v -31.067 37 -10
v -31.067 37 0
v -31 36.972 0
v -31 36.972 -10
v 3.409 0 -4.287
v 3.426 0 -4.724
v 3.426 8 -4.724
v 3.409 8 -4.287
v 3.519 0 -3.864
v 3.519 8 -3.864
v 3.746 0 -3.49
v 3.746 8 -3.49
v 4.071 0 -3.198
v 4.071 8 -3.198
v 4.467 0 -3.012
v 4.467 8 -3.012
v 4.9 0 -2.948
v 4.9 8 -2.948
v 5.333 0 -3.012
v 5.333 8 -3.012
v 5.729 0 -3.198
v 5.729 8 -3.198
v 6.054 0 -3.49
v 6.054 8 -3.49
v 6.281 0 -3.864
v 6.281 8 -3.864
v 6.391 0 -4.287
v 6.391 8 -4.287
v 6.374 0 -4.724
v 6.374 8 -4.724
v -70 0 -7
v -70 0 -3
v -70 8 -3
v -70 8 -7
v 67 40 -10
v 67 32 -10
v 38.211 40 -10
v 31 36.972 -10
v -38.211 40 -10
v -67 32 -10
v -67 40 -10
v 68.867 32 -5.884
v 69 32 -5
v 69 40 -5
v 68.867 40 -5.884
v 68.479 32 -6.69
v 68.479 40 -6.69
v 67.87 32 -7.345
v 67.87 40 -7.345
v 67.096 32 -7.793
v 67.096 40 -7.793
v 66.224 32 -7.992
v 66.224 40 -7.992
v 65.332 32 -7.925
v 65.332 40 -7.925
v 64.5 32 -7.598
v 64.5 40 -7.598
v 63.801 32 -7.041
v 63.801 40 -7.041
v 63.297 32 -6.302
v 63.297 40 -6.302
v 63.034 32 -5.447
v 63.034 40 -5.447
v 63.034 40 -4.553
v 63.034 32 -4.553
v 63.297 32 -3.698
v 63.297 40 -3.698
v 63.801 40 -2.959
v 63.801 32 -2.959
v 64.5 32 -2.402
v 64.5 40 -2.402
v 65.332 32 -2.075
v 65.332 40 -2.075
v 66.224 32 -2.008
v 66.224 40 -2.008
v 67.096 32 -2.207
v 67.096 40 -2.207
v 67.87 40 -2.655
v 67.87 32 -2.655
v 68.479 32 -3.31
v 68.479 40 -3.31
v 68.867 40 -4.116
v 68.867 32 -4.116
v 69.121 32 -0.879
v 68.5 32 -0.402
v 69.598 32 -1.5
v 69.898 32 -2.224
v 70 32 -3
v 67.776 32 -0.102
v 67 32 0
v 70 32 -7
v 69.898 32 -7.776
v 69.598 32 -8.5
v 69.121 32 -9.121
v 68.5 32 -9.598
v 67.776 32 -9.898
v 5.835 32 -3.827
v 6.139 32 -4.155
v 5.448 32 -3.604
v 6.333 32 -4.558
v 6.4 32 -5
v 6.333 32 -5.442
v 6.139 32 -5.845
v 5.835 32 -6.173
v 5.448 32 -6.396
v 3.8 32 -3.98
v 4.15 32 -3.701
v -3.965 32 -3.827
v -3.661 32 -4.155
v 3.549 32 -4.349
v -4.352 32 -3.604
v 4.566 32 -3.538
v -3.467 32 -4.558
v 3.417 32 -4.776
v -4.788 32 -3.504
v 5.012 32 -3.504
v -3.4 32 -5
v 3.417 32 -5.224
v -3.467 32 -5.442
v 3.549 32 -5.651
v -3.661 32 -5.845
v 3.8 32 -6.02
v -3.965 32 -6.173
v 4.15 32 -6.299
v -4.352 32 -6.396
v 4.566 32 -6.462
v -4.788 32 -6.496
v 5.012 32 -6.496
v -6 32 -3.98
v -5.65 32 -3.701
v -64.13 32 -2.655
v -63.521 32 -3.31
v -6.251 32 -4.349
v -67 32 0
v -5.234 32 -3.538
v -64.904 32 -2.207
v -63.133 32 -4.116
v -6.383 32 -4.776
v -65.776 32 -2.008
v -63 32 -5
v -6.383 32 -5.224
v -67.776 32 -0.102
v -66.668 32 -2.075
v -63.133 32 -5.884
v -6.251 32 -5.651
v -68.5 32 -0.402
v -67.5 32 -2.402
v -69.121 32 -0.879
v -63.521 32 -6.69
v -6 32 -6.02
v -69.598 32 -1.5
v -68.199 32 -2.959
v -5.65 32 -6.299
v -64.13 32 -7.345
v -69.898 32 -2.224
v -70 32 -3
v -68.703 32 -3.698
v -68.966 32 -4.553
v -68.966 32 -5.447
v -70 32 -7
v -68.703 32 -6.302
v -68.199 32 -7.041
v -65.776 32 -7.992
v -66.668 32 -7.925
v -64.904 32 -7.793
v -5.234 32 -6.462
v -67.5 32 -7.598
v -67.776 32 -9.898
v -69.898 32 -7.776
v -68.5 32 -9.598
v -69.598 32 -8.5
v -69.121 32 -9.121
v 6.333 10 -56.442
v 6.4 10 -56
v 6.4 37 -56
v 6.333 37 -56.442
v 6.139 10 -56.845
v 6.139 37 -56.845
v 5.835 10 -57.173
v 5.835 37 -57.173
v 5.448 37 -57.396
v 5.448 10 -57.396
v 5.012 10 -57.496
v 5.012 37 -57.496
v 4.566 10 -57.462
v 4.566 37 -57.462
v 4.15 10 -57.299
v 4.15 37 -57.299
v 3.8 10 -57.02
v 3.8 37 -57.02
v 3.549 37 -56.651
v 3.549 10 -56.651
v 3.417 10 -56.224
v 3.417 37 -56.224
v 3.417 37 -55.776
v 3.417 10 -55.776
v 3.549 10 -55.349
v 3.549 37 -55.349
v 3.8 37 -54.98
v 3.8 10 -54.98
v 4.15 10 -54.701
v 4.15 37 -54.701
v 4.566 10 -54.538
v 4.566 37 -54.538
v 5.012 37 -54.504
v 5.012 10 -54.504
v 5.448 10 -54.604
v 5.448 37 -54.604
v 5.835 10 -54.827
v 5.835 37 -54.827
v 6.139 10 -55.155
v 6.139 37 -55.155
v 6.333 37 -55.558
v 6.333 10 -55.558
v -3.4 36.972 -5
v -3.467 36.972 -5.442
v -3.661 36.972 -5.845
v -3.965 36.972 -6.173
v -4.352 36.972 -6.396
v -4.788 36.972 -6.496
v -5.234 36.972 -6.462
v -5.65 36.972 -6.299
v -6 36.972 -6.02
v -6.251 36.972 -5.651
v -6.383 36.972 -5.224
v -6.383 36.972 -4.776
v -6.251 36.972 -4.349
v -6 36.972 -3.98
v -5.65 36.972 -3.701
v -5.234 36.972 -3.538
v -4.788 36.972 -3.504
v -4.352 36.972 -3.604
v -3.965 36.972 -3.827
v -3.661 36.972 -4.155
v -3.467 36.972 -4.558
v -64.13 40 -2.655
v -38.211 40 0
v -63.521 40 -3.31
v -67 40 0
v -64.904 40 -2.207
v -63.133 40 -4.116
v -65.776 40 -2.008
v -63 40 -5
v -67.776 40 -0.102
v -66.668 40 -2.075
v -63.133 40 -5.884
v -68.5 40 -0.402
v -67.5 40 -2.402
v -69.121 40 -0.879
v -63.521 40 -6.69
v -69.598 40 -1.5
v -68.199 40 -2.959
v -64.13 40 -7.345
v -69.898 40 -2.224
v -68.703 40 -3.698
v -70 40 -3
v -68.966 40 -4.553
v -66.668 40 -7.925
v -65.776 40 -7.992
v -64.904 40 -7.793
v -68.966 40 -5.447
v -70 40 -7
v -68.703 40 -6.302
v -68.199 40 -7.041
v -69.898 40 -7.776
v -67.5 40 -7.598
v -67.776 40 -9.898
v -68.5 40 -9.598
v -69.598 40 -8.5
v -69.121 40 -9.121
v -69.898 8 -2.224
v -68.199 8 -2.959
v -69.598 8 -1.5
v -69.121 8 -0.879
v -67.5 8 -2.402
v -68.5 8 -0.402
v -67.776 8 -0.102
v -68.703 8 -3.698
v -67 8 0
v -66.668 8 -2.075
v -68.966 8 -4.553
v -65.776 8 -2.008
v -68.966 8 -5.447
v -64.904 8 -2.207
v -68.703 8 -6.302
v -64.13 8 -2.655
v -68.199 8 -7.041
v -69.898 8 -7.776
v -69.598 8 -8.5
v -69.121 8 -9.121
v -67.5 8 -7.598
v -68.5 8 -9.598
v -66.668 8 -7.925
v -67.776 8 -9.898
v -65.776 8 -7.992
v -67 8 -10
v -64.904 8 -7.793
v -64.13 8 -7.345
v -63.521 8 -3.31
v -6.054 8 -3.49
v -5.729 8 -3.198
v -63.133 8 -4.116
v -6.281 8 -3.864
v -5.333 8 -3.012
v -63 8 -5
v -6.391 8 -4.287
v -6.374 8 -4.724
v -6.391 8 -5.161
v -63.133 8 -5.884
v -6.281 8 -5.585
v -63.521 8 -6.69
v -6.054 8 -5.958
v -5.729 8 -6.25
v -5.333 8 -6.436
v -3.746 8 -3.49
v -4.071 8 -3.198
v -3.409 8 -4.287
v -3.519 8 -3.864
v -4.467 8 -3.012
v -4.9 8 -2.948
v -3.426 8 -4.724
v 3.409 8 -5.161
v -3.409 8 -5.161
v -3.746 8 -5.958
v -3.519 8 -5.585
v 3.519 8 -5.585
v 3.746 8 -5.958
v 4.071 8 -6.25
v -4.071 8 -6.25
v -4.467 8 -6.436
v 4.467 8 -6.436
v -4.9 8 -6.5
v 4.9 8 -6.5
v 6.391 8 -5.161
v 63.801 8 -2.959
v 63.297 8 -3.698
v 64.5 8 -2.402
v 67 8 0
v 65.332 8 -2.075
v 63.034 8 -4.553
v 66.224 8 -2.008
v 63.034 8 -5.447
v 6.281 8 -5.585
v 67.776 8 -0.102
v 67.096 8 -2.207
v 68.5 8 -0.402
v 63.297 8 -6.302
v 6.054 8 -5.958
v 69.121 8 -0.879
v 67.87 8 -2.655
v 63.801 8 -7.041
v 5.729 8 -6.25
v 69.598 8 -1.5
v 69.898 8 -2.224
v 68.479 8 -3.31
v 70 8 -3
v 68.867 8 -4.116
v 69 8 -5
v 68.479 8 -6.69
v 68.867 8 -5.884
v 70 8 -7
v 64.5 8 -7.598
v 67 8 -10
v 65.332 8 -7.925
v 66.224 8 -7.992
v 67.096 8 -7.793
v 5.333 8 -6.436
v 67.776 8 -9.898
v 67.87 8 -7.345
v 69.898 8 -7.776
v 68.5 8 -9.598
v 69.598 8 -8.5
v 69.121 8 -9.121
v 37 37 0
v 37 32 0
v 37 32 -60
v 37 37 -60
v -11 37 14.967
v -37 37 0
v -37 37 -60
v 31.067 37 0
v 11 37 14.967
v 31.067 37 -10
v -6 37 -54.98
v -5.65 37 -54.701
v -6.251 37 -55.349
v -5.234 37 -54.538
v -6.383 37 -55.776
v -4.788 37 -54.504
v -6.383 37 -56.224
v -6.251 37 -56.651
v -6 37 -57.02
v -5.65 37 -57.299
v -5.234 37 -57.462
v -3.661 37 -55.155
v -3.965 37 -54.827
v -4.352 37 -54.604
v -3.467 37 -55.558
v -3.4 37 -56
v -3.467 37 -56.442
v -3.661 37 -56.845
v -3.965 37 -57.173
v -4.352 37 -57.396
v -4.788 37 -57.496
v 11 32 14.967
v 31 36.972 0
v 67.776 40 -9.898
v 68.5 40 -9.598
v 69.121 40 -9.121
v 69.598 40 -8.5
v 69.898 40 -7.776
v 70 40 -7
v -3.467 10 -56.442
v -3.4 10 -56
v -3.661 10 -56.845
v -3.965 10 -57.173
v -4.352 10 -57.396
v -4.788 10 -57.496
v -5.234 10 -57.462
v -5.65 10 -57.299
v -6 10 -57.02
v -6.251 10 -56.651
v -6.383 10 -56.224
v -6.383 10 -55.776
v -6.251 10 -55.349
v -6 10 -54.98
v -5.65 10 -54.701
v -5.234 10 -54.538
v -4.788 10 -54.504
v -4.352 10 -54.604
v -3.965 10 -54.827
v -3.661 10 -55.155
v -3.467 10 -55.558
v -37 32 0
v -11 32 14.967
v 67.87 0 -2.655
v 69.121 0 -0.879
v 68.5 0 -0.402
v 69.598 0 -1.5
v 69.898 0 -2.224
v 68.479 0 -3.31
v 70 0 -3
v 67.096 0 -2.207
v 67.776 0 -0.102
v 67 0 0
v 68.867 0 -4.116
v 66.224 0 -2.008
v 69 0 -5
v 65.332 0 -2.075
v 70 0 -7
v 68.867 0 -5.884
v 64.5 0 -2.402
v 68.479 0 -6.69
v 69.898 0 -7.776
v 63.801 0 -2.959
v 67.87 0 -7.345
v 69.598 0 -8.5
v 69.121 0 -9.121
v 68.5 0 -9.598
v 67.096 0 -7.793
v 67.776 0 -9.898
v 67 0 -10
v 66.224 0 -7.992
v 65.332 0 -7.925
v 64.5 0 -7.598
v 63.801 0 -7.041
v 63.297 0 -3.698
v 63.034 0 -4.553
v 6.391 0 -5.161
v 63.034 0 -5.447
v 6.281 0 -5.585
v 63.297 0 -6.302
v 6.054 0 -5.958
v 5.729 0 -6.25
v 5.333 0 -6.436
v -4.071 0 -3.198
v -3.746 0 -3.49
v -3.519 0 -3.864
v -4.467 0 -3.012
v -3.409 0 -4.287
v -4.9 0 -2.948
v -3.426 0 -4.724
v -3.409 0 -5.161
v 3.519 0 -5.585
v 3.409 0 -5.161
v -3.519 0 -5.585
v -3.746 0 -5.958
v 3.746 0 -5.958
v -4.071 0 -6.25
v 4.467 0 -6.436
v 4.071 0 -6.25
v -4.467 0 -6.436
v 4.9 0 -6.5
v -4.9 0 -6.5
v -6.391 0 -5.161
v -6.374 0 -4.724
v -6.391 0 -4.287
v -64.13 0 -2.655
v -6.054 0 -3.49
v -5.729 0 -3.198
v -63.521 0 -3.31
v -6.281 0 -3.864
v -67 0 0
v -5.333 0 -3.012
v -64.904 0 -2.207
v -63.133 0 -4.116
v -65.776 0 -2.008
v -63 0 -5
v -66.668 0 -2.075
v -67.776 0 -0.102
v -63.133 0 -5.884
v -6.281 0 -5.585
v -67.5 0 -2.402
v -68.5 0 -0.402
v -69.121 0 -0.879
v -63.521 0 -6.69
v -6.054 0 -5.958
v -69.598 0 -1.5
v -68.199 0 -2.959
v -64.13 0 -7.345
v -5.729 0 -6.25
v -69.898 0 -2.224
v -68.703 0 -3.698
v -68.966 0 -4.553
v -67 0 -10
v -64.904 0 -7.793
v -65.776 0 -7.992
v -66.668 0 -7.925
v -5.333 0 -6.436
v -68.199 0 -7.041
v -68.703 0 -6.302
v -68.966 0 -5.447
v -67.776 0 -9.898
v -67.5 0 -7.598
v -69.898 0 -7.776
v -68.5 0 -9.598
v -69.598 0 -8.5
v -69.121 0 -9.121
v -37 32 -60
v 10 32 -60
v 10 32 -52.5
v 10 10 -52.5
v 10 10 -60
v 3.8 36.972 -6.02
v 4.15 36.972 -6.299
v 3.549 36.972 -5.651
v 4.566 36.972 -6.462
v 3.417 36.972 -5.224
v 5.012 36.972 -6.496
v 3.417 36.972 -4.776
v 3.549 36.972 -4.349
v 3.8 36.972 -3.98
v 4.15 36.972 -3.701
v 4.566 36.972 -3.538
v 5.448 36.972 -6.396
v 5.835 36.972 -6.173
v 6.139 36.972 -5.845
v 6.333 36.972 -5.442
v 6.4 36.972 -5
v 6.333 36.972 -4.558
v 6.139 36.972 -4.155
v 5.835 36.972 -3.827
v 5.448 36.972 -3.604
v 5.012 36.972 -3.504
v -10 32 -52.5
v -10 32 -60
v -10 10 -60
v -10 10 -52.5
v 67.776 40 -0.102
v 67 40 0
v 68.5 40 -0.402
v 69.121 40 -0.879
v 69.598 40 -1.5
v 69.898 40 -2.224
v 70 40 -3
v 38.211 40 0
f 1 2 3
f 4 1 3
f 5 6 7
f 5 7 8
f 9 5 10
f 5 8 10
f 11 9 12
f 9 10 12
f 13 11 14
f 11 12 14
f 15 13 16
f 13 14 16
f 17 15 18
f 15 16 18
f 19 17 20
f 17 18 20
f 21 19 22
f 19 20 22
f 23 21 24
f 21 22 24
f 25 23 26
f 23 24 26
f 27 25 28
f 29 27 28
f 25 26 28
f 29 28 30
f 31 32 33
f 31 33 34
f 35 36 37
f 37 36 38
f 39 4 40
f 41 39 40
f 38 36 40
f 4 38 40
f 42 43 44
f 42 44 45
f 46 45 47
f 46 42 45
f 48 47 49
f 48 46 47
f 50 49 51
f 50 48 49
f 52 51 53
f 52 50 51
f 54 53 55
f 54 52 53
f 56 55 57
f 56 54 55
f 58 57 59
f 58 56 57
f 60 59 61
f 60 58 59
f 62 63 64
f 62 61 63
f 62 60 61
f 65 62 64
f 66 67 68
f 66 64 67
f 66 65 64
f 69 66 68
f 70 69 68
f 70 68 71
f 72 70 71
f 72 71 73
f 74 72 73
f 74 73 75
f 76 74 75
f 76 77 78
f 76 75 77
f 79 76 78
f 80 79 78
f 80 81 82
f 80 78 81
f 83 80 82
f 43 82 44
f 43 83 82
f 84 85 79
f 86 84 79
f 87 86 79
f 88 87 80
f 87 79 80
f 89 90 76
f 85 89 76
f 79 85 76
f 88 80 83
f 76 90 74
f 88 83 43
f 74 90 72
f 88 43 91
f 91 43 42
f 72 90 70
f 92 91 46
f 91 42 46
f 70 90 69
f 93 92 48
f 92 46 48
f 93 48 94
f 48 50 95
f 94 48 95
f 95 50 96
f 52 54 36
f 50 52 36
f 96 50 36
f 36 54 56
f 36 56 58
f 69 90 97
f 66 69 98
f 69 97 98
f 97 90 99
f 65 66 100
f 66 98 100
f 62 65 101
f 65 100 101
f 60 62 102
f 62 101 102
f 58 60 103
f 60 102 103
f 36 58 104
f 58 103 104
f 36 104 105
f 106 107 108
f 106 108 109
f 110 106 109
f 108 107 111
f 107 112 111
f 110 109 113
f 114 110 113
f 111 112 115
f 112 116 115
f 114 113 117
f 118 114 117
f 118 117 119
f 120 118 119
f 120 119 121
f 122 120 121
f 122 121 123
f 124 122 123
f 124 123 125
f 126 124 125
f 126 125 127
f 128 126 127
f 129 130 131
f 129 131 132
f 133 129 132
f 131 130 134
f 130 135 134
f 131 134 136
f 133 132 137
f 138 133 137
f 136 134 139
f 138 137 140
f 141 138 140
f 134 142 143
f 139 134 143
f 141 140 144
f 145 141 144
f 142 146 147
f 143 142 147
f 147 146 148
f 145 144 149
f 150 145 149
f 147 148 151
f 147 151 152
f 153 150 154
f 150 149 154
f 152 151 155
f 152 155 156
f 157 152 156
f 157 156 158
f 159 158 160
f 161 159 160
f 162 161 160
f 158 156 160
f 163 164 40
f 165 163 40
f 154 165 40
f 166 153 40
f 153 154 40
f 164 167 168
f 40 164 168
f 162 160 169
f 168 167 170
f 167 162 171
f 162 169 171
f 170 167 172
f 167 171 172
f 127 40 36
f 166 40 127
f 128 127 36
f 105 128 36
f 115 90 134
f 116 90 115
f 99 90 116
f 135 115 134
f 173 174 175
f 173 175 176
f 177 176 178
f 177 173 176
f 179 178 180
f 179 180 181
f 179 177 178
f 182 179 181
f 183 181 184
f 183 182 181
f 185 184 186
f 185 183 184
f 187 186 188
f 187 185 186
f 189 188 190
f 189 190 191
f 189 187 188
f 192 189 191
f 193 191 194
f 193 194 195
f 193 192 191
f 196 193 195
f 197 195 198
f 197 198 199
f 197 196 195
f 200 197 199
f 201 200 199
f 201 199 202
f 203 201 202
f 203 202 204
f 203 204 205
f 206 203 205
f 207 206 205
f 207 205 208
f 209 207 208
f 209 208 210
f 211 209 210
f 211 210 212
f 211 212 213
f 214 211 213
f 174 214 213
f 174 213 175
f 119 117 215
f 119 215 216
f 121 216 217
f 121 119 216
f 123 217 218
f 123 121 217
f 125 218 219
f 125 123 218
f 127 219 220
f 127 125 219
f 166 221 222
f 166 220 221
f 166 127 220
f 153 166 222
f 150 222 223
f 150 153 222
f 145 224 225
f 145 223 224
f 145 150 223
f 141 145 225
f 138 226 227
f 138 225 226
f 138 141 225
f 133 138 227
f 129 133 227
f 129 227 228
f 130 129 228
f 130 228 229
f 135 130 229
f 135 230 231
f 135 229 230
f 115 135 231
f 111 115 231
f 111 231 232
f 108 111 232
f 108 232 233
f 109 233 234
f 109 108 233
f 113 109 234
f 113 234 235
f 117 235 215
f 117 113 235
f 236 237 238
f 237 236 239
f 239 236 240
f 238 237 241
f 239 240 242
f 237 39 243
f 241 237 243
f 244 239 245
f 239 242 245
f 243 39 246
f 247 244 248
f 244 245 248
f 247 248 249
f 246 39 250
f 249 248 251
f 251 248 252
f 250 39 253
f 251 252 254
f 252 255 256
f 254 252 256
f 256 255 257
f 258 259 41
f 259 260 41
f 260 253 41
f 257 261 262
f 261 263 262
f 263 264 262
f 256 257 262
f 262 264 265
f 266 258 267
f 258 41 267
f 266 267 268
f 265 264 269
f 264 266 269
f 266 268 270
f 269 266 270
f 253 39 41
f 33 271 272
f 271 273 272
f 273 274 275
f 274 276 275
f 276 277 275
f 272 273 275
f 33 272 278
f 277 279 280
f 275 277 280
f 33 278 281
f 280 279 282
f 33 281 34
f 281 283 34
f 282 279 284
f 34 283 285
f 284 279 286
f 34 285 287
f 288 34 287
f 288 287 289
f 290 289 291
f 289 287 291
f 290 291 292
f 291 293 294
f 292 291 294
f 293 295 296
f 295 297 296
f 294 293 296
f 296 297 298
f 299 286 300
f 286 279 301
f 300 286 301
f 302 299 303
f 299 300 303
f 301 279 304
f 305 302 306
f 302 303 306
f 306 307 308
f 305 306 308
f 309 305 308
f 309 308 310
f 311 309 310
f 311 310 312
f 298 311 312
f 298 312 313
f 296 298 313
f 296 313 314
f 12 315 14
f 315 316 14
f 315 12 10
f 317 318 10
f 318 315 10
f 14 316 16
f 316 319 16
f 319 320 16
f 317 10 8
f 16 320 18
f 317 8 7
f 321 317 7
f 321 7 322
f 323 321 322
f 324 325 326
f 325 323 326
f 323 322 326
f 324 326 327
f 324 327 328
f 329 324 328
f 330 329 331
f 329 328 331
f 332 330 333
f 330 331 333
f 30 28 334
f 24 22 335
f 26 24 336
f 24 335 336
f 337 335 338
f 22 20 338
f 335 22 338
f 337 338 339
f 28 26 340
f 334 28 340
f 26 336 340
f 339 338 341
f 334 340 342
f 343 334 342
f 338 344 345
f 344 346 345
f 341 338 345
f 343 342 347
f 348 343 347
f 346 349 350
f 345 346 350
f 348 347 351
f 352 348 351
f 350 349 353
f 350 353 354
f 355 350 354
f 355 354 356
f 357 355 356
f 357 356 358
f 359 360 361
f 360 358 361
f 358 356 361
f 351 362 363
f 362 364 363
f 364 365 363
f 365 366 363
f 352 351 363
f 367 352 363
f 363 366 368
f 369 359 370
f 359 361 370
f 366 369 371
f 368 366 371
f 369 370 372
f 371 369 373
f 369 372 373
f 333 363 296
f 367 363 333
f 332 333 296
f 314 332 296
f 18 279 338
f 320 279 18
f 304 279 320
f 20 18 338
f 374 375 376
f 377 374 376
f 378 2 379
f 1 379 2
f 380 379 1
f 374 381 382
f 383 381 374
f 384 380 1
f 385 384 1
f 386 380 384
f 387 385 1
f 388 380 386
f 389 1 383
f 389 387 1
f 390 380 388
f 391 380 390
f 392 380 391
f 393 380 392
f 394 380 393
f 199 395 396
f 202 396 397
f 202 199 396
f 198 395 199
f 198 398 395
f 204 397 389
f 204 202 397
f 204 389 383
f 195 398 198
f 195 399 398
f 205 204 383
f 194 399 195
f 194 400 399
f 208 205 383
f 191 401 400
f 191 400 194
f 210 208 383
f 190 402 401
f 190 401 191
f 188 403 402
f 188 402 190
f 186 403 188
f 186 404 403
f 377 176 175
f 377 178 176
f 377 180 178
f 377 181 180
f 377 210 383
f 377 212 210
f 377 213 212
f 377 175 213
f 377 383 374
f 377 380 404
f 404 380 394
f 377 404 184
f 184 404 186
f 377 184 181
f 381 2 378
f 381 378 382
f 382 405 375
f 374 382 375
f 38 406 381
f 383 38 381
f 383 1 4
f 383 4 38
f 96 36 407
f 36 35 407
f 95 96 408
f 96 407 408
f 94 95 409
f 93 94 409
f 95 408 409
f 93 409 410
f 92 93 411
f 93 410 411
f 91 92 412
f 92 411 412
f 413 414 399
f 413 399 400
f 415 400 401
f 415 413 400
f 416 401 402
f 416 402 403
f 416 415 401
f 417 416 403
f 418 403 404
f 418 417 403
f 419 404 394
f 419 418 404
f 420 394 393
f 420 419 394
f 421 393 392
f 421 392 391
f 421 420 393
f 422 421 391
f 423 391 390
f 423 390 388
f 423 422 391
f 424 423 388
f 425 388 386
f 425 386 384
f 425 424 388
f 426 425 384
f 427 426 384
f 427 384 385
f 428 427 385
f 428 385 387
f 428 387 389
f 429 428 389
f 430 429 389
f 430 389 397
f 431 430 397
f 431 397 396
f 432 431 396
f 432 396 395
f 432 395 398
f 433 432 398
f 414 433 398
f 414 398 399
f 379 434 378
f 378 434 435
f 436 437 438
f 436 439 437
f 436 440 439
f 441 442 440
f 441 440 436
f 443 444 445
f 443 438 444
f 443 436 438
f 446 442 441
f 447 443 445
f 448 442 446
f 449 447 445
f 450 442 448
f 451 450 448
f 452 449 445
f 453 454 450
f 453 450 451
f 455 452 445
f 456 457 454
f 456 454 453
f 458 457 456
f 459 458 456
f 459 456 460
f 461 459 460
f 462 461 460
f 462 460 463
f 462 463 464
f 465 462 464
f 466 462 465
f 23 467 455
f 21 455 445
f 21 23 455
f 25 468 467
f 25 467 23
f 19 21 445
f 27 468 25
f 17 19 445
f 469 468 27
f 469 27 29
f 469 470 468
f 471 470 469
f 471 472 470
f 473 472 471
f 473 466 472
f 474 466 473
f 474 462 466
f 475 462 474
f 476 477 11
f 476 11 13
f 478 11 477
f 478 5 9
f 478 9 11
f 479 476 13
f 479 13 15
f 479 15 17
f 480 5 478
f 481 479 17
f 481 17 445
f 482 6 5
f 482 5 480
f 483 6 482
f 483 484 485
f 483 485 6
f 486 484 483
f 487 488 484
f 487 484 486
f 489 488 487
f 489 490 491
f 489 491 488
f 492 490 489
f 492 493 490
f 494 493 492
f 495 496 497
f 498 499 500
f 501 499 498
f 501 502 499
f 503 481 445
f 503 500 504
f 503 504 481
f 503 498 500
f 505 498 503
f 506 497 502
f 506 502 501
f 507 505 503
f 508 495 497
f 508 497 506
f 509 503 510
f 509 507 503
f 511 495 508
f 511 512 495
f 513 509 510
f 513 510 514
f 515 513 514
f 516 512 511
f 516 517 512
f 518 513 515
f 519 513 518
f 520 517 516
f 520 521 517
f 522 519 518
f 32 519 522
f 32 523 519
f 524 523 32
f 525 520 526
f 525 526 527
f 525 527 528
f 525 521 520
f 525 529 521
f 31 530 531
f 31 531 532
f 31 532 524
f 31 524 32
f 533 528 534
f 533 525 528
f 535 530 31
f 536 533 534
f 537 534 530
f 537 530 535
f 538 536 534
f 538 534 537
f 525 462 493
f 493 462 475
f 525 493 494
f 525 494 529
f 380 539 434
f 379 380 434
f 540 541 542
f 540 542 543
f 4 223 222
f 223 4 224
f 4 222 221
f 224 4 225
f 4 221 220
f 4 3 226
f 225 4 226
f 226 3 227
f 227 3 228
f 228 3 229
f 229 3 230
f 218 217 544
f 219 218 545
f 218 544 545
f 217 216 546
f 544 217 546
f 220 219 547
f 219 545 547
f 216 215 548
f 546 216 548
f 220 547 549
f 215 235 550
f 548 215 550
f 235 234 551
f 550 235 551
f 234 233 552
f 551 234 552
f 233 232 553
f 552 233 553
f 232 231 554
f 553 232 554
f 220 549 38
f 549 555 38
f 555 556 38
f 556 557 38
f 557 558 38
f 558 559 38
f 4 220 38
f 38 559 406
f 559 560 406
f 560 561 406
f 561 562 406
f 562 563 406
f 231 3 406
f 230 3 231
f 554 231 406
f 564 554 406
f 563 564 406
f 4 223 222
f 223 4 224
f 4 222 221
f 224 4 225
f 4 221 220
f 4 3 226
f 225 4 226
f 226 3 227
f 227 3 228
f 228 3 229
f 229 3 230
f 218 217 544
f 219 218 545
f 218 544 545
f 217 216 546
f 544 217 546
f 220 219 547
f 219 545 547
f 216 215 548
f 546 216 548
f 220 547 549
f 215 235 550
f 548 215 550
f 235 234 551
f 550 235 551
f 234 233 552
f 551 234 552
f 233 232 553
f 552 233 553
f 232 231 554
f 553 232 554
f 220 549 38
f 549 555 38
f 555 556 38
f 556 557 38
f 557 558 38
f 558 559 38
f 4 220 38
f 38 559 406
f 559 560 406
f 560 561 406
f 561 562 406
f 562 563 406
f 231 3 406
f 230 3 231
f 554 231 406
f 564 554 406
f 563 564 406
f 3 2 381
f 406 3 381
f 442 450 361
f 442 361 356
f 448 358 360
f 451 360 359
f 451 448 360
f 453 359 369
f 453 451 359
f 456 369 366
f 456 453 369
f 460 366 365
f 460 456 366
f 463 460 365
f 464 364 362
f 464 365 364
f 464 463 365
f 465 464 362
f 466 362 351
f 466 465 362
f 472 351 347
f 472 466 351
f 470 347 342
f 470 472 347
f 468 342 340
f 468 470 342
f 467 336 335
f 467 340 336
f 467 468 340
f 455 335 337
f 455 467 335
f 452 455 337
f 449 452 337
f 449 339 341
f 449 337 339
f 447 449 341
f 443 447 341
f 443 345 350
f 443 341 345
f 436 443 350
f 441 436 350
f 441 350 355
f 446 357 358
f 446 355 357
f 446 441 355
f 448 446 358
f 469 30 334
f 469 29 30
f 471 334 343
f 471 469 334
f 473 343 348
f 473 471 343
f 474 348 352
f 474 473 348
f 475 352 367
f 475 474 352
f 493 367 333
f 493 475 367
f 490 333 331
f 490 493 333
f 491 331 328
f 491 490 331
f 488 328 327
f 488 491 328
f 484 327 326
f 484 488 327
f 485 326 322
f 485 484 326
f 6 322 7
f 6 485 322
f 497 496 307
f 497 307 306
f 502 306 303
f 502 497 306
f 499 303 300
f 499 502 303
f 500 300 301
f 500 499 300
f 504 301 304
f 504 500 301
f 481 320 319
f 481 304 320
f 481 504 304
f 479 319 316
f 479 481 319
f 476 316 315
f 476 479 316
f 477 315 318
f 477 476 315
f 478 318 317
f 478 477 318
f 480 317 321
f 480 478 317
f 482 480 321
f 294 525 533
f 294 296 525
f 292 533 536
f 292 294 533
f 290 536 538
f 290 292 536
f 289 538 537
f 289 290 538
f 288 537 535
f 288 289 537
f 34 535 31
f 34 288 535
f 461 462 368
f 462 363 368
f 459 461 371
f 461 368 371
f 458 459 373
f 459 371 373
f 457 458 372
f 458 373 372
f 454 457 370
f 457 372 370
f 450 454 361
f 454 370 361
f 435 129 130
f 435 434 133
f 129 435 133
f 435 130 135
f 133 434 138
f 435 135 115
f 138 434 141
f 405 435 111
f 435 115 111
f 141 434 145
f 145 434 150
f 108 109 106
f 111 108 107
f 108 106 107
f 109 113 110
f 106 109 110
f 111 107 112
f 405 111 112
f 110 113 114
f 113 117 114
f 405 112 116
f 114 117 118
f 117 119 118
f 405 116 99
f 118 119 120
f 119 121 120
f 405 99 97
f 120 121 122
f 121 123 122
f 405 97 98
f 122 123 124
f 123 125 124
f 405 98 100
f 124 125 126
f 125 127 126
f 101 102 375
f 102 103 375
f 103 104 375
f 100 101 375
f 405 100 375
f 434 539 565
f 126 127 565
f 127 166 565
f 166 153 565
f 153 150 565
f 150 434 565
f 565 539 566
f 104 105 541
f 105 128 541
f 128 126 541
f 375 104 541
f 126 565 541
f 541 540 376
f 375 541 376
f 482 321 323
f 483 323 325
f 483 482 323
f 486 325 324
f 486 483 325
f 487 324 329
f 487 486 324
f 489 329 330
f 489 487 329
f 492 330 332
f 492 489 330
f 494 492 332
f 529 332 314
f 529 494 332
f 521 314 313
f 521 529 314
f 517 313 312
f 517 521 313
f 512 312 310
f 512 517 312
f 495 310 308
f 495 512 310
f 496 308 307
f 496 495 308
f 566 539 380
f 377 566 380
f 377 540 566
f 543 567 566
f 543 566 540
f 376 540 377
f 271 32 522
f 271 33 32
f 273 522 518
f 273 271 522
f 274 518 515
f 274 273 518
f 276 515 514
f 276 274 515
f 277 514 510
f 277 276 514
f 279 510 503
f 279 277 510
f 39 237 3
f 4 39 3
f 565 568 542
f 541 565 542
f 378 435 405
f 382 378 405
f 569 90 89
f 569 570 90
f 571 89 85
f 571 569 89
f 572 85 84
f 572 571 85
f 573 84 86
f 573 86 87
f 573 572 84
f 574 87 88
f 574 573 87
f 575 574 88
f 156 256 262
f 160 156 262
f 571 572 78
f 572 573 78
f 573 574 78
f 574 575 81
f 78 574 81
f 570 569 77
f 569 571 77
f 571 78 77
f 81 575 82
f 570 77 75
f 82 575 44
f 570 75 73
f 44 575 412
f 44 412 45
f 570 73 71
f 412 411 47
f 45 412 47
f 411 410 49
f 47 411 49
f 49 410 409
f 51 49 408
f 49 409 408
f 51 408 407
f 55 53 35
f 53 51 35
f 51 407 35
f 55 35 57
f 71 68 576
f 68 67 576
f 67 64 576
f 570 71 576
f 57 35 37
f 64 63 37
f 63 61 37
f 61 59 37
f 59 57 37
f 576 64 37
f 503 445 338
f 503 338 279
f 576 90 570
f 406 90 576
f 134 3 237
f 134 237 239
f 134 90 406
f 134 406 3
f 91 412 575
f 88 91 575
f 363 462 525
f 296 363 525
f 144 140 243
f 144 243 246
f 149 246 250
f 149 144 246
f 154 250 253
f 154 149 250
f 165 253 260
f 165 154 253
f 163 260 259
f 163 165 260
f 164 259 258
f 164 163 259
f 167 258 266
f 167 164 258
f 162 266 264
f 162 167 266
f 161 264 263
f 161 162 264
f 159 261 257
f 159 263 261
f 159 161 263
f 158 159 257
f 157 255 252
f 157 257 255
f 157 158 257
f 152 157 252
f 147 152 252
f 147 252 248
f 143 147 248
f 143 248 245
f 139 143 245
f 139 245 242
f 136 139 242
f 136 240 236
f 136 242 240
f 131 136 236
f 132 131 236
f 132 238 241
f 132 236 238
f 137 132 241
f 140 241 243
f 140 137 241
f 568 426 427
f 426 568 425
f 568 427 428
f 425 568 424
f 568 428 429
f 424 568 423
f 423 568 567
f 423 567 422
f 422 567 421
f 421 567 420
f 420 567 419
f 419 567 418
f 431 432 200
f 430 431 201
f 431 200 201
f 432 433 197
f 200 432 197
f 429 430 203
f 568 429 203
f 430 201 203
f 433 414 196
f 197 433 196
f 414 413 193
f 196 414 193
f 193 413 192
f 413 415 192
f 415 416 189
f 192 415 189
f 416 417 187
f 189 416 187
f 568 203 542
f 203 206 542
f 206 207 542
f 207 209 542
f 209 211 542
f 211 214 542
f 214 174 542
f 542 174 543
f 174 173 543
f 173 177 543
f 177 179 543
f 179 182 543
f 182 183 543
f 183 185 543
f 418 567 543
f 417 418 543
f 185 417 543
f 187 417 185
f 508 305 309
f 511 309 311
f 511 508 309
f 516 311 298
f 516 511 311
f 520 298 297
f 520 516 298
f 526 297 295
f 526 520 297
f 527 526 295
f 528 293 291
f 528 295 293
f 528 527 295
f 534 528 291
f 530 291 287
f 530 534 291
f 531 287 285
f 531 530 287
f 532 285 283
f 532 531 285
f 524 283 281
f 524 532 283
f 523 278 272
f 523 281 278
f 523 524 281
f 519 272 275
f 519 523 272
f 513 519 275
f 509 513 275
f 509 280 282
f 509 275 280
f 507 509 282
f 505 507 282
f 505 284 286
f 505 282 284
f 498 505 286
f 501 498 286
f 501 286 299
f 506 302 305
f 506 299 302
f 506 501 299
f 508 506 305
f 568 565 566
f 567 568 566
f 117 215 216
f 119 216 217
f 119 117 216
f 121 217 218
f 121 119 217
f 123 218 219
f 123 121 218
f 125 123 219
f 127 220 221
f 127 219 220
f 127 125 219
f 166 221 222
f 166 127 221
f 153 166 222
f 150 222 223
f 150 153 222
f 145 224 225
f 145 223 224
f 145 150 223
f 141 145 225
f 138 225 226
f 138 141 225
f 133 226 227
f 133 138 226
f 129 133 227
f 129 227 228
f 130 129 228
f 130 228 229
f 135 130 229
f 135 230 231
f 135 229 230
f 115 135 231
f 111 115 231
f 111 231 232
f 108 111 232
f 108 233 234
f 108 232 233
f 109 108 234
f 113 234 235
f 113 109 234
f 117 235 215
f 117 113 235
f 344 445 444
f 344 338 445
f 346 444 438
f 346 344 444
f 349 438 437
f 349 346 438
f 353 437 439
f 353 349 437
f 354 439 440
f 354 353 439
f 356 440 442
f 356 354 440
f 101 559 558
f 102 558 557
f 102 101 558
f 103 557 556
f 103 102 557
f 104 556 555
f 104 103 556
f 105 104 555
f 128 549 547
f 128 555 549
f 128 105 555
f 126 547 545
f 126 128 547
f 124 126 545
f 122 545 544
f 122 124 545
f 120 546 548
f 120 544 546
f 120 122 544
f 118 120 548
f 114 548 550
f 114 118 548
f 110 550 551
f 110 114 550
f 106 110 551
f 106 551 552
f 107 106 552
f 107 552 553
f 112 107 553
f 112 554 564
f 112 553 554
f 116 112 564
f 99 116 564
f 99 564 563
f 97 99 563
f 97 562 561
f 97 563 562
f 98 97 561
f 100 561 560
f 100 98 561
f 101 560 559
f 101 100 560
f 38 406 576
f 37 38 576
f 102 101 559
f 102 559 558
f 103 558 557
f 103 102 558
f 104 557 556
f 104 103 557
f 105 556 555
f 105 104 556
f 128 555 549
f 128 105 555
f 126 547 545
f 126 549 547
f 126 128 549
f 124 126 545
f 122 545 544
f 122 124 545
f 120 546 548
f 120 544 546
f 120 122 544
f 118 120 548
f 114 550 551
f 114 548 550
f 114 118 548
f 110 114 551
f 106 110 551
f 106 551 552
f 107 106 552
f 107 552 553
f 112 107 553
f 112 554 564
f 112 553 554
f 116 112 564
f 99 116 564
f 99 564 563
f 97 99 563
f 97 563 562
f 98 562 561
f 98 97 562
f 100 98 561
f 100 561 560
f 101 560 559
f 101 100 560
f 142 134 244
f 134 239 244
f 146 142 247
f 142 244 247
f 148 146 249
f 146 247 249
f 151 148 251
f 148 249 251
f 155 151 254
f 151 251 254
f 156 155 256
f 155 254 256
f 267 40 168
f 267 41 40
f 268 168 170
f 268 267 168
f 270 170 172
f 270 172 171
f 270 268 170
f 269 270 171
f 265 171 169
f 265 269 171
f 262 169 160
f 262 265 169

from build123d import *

# Parameters (mm, degrees)
SKETCH1_R               = 1.5
BOSS_EXTRUDE1_DEPTH     = 40
SKETCH3_W               = 10
SKETCH3_H               = 24
CUT_EXTRUDE1_DEPTH      = 71
CUT_EXTRUDE1_DEPTH_BACK = 71
FILLET2_R               = 3
FILLET3_R               = 3
BOSS_EXTRUDE4_START     = 32
SKETCH7_R               = 1.5
BOSS_EXTRUDE4_DEPTH     = 5
BOSS_EXTRUDE5_START     = 10
SKETCH7_5_W             = 20
SKETCH7_5_H             = 7.5
SKETCH7_5_R             = 1.5
BOSS_EXTRUDE5_DEPTH     = 22
SKETCH5_R               = 1.5
CUT_EXTRUDE4_DEPTH      = 11
SKETCH4_R               = 3
CUT_EXTRUDE2_DEPTH      = 41
CUT_EXTRUDE2_DEPTH_BACK = 1
CUT_EXTRUDE6_DEPTH      = 10


with BuildPart() as part:
    # Sketch1 → Boss-Extrude1 (new body)
    with BuildSketch(Plane(origin=(0, 0, 0), x_dir=(1, 0, 0), z_dir=(0, 1, 0))):
        Polygon((-70, 10), (-15, 10), (-11, 10), (11, 10), (15, 10), (70, 10), (70, 0), (-70, 0), align=None)
        with Locations((-4.9, 5)):
            Circle(SKETCH1_R, mode=Mode.SUBTRACT)
        with Locations((4.9, 5)):
            Circle(SKETCH1_R, mode=Mode.SUBTRACT)
    extrude(amount=BOSS_EXTRUDE1_DEPTH)

    # Sketch3 → Cut-Extrude1 (cut, two sides)
    with BuildSketch(Plane(origin=(0, 0, 0), x_dir=(0, 0, -1), z_dir=(1, 0, 0))) as cut_extrude1_sk:
        with Locations((5, 20)):
            Rectangle(SKETCH3_W, SKETCH3_H)
    extrude(amount=CUT_EXTRUDE1_DEPTH, mode=Mode.SUBTRACT)
    extrude(cut_extrude1_sk.sketch, amount=-CUT_EXTRUDE1_DEPTH_BACK, mode=Mode.SUBTRACT)

    # Fillet2
    fillet2_edges = [part.edges().sort_by_distance(p)[0] for p in [
        (70, 36, -10),
        (-70, 36, -10),
        (-70, 36, 0),
        (70, 36, 0),
    ]]
    fillet(fillet2_edges, radius=FILLET2_R)

    # Fillet3
    fillet3_edges = [part.edges().sort_by_distance(p)[0] for p in [
        (70, 4, -10),
        (70, 4, 0),
        (-70, 4, 0),
        (-70, 4, -10),
    ]]
    fillet(fillet3_edges, radius=FILLET3_R)

    # Sketch5 → Cut-Extrude4 (cut, symmetric)
    with BuildSketch(Plane(origin=(0, 0, 0), x_dir=(1, 0, 0), z_dir=(0, 1, 0))):
        with Locations((-4.9, 4.44843495)):
            Circle(SKETCH5_R)
        with Locations((4.9, 4.44843495)):
            Circle(SKETCH5_R)
    extrude(amount=CUT_EXTRUDE4_DEPTH, both=True, mode=Mode.SUBTRACT)

    # Sketch4 → Cut-Extrude2 (cut, two sides)
    with BuildSketch(Plane(origin=(0, 0, 0), x_dir=(1, 0, 0), z_dir=(0, 1, 0))) as cut_extrude2_sk:
        with Locations((-66, 5)):
            Circle(SKETCH4_R)
        with Locations((66, 5)):
            Circle(SKETCH4_R)
    extrude(amount=CUT_EXTRUDE2_DEPTH, mode=Mode.SUBTRACT)
    extrude(cut_extrude2_sk.sketch, amount=-CUT_EXTRUDE2_DEPTH_BACK, mode=Mode.SUBTRACT)


with BuildPart() as body_2:
    # Sketch7 → Boss-Extrude4 (new body)
    with BuildSketch(Plane(origin=(0, 0, 0), x_dir=(1, 0, 0), z_dir=(0, 1, 0)).offset(BOSS_EXTRUDE4_START)):
        Polygon((-37, 0), (-11, -14.966629547), (11, -14.966629547), (37, 0), (37, 60), (-37, 60), align=None)
        with Locations((-4.9, 56)):
            Circle(SKETCH7_R, mode=Mode.SUBTRACT)
        with Locations((4.9, 56)):
            Circle(SKETCH7_R, mode=Mode.SUBTRACT)
        with Locations((-4.9, 5)):
            Circle(SKETCH7_R, mode=Mode.SUBTRACT)
        with Locations((4.9, 5)):
            Circle(SKETCH7_R, mode=Mode.SUBTRACT)
    extrude(amount=BOSS_EXTRUDE4_DEPTH)

    # Sketch7<5> → Boss-Extrude5 (add)
    with BuildSketch(Plane(origin=(0, 0, 0), x_dir=(1, 0, 0), z_dir=(0, 1, 0)).offset(BOSS_EXTRUDE5_START)):
        with Locations((0, 56.25)):
            Rectangle(SKETCH7_5_W, SKETCH7_5_H)
        with Locations((4.9, 56)):
            Circle(SKETCH7_5_R, mode=Mode.SUBTRACT)
        with Locations((-4.9, 56)):
            Circle(SKETCH7_5_R, mode=Mode.SUBTRACT)
    extrude(amount=BOSS_EXTRUDE5_DEPTH)


with BuildPart() as cut_extrude6_tool:
    # Sketch9 → Cut-Extrude6 (new body)
    with BuildSketch(Plane.XY):
        Polygon((-38.210891508, 40), (-31, 36.971825845), (31, 36.971825845), (38.210891508, 40), align=None)
    extrude(amount=-CUT_EXTRUDE6_DEPTH)


with BuildPart() as part_1:
    add(part.part)

    # Cut-Extrude6: cut by cut_extrude6_tool
    add(cut_extrude6_tool.part, mode=Mode.SUBTRACT)


with BuildPart() as body_2_1:
    add(body_2.part)

    # Cut-Extrude6: cut by cut_extrude6_tool
    add(cut_extrude6_tool.part, mode=Mode.SUBTRACT)


solid = Compound([part_1.part, body_2_1.part])
